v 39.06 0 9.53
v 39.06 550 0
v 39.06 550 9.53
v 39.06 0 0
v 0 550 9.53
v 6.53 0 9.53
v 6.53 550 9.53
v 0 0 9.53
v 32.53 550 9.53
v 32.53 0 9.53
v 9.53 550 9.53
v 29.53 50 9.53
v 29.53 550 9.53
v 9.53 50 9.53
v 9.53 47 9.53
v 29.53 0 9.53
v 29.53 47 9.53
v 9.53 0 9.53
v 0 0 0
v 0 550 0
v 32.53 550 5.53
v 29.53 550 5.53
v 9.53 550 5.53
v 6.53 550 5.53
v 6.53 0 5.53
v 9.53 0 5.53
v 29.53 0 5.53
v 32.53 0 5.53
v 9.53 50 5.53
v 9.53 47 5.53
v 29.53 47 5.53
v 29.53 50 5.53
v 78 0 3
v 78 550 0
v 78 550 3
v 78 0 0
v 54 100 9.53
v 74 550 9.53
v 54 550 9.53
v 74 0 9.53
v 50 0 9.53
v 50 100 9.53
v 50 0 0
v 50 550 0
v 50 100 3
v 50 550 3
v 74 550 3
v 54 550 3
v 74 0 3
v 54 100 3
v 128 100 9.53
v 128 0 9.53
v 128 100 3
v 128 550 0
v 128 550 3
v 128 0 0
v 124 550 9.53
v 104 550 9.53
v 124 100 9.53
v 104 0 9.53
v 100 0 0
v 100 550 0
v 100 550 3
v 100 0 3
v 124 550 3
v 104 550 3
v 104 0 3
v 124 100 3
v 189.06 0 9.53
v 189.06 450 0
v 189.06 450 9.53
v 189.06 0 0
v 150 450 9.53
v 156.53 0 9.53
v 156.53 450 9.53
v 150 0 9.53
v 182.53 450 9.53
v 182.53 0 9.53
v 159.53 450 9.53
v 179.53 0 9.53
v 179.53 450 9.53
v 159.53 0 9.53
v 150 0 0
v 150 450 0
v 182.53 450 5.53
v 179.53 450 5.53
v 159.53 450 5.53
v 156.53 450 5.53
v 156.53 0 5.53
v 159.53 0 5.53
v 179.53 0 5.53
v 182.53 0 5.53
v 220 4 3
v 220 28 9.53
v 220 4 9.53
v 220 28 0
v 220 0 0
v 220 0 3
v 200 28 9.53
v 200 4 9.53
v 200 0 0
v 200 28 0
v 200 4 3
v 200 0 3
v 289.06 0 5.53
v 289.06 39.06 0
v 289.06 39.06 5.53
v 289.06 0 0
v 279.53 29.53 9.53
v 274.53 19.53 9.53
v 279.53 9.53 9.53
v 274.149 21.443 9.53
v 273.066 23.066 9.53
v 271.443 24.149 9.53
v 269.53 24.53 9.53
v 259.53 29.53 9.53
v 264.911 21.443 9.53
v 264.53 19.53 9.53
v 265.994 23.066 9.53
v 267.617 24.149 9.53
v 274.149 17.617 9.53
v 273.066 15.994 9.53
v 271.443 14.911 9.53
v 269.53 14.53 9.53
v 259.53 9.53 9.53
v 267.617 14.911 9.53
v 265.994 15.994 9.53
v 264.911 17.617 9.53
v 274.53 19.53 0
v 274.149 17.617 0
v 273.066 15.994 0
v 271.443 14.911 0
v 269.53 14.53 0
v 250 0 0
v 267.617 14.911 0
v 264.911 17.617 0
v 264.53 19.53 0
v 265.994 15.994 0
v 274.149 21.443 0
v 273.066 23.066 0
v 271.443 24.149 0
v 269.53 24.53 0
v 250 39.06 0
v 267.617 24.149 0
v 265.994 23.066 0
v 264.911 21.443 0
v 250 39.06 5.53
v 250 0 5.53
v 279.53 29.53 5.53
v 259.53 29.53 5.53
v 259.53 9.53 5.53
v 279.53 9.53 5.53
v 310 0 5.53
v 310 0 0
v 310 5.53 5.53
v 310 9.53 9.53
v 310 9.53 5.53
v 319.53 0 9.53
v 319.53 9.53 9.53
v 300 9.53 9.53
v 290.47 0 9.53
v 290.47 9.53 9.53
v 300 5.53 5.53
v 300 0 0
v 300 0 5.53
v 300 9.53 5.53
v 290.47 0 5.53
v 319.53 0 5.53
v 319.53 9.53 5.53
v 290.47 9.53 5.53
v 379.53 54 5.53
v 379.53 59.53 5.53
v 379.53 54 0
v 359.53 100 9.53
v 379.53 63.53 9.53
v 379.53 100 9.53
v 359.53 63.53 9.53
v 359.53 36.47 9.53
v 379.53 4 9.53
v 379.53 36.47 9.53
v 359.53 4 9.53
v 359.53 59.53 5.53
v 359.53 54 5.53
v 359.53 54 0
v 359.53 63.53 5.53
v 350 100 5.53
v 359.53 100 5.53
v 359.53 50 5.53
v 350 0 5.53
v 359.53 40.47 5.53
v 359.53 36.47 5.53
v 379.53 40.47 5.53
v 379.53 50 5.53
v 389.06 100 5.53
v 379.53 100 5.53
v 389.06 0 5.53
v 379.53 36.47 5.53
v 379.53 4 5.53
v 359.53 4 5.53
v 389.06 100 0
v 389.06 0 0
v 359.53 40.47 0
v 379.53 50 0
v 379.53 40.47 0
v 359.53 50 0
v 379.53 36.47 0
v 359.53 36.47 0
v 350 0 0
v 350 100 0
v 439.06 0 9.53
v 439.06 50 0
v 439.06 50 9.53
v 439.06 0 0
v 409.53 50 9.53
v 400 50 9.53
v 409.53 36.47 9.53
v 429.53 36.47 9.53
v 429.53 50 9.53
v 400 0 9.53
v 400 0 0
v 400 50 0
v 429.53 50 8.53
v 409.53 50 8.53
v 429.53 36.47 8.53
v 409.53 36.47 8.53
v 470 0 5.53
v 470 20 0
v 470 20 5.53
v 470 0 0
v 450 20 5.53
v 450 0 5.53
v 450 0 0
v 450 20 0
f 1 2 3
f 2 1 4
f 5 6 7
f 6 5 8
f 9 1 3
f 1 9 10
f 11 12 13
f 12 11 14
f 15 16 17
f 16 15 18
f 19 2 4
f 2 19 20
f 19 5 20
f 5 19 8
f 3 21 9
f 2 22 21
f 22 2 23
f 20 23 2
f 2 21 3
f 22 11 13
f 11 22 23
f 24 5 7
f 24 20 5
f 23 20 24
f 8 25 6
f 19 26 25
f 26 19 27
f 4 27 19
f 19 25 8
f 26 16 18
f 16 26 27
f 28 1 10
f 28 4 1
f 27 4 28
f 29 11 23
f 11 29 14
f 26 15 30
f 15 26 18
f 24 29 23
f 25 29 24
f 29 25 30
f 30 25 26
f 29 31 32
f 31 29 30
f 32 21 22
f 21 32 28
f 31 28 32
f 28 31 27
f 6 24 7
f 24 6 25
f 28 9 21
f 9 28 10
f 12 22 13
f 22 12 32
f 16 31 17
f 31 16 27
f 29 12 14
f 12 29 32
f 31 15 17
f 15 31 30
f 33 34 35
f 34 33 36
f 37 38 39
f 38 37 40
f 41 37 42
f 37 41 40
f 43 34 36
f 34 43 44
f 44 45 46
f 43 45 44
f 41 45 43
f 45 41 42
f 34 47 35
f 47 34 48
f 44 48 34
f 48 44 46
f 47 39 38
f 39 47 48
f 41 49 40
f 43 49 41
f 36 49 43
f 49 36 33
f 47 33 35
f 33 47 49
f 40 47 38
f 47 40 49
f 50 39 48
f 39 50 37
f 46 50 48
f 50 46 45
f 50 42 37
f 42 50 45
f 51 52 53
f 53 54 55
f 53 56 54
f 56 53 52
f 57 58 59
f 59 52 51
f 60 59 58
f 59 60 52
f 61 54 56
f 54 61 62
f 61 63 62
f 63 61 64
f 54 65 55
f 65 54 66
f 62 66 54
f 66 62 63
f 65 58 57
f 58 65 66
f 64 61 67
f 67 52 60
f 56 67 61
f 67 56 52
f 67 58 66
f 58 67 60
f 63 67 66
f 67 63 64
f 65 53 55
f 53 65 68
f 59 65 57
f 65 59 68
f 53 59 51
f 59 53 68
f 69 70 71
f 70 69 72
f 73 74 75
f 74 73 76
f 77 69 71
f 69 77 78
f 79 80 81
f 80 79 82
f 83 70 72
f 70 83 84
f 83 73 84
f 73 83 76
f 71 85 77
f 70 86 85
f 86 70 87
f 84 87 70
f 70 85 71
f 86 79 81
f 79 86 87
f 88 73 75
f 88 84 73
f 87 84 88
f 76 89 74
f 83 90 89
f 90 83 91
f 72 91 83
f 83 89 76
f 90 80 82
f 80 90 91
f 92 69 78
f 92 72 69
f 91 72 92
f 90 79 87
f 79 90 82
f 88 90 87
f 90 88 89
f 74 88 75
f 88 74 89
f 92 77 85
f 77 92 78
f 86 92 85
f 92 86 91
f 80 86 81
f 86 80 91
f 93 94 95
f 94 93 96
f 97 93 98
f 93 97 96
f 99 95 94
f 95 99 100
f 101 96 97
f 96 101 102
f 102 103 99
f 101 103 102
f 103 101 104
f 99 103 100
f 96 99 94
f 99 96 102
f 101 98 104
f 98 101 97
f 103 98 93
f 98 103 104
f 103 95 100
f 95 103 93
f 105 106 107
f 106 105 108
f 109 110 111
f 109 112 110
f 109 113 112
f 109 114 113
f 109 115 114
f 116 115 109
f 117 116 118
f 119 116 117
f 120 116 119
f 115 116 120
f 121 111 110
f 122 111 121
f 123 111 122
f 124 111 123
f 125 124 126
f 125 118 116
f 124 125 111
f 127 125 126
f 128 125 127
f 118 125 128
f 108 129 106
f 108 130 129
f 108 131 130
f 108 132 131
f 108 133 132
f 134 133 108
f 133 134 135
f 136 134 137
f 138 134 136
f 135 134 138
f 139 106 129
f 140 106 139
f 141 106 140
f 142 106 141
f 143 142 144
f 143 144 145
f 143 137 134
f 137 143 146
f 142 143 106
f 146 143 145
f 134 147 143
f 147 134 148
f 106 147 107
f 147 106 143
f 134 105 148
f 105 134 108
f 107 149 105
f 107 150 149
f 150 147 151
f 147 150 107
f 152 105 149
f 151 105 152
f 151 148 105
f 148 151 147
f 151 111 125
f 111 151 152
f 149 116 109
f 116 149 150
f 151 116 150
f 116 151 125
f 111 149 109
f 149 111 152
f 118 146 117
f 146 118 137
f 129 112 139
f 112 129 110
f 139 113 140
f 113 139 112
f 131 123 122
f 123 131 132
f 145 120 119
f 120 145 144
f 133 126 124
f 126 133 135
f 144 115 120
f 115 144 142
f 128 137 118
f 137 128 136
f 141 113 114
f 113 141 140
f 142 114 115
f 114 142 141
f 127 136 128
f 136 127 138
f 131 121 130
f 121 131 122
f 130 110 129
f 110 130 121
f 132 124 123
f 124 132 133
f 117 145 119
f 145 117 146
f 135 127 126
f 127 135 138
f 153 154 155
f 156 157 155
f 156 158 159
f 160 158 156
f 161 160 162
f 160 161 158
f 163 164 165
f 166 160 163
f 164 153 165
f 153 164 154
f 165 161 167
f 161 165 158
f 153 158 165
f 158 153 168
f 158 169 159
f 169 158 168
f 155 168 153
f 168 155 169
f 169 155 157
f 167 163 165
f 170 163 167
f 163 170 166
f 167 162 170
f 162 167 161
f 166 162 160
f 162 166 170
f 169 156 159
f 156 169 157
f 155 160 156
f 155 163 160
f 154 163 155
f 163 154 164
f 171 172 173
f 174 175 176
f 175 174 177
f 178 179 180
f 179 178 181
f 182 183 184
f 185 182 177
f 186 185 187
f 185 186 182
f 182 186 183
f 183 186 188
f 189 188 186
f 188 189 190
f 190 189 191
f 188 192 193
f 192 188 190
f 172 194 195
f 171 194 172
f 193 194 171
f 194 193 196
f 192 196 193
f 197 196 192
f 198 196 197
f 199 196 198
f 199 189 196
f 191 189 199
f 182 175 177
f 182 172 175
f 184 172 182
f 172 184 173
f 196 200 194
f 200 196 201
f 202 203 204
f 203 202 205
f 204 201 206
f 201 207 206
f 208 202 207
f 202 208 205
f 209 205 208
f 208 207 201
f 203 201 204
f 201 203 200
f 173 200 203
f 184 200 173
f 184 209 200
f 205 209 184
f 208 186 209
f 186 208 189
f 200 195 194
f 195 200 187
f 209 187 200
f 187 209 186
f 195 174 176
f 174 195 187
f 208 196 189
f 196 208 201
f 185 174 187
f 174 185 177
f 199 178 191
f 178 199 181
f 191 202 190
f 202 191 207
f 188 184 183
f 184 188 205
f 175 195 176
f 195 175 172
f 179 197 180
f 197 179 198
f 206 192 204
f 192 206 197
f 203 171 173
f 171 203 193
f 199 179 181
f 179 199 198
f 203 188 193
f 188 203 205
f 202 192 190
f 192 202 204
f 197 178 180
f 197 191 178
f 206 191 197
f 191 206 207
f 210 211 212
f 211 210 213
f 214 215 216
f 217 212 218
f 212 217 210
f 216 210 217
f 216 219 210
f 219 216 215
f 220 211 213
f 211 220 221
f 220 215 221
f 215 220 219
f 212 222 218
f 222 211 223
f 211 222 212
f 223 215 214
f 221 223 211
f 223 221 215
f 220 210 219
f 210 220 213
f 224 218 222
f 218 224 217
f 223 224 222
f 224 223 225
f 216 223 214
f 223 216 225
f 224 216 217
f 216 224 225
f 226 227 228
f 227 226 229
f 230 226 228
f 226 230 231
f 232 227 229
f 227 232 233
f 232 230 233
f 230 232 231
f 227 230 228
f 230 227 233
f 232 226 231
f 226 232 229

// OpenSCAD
use <../pipe_parts.scad>


pipe_back();
translate([1*50, 0, 0])
pipe_side(right=true);
translate([2*50, 0, 0])
pipe_side(right=false);
translate([3*50, 0, 0])
pipe_front();
translate([4*50, 0, 0])
languid();
translate([5*50, 0, 0])
foot_base();
translate([6*50, 0, 0])
wedge();
translate([7*50, 0, 0])
upper_lip();
translate([8*50, 0, 0])
face();
translate([9*50, 0, 0])
stopper();
